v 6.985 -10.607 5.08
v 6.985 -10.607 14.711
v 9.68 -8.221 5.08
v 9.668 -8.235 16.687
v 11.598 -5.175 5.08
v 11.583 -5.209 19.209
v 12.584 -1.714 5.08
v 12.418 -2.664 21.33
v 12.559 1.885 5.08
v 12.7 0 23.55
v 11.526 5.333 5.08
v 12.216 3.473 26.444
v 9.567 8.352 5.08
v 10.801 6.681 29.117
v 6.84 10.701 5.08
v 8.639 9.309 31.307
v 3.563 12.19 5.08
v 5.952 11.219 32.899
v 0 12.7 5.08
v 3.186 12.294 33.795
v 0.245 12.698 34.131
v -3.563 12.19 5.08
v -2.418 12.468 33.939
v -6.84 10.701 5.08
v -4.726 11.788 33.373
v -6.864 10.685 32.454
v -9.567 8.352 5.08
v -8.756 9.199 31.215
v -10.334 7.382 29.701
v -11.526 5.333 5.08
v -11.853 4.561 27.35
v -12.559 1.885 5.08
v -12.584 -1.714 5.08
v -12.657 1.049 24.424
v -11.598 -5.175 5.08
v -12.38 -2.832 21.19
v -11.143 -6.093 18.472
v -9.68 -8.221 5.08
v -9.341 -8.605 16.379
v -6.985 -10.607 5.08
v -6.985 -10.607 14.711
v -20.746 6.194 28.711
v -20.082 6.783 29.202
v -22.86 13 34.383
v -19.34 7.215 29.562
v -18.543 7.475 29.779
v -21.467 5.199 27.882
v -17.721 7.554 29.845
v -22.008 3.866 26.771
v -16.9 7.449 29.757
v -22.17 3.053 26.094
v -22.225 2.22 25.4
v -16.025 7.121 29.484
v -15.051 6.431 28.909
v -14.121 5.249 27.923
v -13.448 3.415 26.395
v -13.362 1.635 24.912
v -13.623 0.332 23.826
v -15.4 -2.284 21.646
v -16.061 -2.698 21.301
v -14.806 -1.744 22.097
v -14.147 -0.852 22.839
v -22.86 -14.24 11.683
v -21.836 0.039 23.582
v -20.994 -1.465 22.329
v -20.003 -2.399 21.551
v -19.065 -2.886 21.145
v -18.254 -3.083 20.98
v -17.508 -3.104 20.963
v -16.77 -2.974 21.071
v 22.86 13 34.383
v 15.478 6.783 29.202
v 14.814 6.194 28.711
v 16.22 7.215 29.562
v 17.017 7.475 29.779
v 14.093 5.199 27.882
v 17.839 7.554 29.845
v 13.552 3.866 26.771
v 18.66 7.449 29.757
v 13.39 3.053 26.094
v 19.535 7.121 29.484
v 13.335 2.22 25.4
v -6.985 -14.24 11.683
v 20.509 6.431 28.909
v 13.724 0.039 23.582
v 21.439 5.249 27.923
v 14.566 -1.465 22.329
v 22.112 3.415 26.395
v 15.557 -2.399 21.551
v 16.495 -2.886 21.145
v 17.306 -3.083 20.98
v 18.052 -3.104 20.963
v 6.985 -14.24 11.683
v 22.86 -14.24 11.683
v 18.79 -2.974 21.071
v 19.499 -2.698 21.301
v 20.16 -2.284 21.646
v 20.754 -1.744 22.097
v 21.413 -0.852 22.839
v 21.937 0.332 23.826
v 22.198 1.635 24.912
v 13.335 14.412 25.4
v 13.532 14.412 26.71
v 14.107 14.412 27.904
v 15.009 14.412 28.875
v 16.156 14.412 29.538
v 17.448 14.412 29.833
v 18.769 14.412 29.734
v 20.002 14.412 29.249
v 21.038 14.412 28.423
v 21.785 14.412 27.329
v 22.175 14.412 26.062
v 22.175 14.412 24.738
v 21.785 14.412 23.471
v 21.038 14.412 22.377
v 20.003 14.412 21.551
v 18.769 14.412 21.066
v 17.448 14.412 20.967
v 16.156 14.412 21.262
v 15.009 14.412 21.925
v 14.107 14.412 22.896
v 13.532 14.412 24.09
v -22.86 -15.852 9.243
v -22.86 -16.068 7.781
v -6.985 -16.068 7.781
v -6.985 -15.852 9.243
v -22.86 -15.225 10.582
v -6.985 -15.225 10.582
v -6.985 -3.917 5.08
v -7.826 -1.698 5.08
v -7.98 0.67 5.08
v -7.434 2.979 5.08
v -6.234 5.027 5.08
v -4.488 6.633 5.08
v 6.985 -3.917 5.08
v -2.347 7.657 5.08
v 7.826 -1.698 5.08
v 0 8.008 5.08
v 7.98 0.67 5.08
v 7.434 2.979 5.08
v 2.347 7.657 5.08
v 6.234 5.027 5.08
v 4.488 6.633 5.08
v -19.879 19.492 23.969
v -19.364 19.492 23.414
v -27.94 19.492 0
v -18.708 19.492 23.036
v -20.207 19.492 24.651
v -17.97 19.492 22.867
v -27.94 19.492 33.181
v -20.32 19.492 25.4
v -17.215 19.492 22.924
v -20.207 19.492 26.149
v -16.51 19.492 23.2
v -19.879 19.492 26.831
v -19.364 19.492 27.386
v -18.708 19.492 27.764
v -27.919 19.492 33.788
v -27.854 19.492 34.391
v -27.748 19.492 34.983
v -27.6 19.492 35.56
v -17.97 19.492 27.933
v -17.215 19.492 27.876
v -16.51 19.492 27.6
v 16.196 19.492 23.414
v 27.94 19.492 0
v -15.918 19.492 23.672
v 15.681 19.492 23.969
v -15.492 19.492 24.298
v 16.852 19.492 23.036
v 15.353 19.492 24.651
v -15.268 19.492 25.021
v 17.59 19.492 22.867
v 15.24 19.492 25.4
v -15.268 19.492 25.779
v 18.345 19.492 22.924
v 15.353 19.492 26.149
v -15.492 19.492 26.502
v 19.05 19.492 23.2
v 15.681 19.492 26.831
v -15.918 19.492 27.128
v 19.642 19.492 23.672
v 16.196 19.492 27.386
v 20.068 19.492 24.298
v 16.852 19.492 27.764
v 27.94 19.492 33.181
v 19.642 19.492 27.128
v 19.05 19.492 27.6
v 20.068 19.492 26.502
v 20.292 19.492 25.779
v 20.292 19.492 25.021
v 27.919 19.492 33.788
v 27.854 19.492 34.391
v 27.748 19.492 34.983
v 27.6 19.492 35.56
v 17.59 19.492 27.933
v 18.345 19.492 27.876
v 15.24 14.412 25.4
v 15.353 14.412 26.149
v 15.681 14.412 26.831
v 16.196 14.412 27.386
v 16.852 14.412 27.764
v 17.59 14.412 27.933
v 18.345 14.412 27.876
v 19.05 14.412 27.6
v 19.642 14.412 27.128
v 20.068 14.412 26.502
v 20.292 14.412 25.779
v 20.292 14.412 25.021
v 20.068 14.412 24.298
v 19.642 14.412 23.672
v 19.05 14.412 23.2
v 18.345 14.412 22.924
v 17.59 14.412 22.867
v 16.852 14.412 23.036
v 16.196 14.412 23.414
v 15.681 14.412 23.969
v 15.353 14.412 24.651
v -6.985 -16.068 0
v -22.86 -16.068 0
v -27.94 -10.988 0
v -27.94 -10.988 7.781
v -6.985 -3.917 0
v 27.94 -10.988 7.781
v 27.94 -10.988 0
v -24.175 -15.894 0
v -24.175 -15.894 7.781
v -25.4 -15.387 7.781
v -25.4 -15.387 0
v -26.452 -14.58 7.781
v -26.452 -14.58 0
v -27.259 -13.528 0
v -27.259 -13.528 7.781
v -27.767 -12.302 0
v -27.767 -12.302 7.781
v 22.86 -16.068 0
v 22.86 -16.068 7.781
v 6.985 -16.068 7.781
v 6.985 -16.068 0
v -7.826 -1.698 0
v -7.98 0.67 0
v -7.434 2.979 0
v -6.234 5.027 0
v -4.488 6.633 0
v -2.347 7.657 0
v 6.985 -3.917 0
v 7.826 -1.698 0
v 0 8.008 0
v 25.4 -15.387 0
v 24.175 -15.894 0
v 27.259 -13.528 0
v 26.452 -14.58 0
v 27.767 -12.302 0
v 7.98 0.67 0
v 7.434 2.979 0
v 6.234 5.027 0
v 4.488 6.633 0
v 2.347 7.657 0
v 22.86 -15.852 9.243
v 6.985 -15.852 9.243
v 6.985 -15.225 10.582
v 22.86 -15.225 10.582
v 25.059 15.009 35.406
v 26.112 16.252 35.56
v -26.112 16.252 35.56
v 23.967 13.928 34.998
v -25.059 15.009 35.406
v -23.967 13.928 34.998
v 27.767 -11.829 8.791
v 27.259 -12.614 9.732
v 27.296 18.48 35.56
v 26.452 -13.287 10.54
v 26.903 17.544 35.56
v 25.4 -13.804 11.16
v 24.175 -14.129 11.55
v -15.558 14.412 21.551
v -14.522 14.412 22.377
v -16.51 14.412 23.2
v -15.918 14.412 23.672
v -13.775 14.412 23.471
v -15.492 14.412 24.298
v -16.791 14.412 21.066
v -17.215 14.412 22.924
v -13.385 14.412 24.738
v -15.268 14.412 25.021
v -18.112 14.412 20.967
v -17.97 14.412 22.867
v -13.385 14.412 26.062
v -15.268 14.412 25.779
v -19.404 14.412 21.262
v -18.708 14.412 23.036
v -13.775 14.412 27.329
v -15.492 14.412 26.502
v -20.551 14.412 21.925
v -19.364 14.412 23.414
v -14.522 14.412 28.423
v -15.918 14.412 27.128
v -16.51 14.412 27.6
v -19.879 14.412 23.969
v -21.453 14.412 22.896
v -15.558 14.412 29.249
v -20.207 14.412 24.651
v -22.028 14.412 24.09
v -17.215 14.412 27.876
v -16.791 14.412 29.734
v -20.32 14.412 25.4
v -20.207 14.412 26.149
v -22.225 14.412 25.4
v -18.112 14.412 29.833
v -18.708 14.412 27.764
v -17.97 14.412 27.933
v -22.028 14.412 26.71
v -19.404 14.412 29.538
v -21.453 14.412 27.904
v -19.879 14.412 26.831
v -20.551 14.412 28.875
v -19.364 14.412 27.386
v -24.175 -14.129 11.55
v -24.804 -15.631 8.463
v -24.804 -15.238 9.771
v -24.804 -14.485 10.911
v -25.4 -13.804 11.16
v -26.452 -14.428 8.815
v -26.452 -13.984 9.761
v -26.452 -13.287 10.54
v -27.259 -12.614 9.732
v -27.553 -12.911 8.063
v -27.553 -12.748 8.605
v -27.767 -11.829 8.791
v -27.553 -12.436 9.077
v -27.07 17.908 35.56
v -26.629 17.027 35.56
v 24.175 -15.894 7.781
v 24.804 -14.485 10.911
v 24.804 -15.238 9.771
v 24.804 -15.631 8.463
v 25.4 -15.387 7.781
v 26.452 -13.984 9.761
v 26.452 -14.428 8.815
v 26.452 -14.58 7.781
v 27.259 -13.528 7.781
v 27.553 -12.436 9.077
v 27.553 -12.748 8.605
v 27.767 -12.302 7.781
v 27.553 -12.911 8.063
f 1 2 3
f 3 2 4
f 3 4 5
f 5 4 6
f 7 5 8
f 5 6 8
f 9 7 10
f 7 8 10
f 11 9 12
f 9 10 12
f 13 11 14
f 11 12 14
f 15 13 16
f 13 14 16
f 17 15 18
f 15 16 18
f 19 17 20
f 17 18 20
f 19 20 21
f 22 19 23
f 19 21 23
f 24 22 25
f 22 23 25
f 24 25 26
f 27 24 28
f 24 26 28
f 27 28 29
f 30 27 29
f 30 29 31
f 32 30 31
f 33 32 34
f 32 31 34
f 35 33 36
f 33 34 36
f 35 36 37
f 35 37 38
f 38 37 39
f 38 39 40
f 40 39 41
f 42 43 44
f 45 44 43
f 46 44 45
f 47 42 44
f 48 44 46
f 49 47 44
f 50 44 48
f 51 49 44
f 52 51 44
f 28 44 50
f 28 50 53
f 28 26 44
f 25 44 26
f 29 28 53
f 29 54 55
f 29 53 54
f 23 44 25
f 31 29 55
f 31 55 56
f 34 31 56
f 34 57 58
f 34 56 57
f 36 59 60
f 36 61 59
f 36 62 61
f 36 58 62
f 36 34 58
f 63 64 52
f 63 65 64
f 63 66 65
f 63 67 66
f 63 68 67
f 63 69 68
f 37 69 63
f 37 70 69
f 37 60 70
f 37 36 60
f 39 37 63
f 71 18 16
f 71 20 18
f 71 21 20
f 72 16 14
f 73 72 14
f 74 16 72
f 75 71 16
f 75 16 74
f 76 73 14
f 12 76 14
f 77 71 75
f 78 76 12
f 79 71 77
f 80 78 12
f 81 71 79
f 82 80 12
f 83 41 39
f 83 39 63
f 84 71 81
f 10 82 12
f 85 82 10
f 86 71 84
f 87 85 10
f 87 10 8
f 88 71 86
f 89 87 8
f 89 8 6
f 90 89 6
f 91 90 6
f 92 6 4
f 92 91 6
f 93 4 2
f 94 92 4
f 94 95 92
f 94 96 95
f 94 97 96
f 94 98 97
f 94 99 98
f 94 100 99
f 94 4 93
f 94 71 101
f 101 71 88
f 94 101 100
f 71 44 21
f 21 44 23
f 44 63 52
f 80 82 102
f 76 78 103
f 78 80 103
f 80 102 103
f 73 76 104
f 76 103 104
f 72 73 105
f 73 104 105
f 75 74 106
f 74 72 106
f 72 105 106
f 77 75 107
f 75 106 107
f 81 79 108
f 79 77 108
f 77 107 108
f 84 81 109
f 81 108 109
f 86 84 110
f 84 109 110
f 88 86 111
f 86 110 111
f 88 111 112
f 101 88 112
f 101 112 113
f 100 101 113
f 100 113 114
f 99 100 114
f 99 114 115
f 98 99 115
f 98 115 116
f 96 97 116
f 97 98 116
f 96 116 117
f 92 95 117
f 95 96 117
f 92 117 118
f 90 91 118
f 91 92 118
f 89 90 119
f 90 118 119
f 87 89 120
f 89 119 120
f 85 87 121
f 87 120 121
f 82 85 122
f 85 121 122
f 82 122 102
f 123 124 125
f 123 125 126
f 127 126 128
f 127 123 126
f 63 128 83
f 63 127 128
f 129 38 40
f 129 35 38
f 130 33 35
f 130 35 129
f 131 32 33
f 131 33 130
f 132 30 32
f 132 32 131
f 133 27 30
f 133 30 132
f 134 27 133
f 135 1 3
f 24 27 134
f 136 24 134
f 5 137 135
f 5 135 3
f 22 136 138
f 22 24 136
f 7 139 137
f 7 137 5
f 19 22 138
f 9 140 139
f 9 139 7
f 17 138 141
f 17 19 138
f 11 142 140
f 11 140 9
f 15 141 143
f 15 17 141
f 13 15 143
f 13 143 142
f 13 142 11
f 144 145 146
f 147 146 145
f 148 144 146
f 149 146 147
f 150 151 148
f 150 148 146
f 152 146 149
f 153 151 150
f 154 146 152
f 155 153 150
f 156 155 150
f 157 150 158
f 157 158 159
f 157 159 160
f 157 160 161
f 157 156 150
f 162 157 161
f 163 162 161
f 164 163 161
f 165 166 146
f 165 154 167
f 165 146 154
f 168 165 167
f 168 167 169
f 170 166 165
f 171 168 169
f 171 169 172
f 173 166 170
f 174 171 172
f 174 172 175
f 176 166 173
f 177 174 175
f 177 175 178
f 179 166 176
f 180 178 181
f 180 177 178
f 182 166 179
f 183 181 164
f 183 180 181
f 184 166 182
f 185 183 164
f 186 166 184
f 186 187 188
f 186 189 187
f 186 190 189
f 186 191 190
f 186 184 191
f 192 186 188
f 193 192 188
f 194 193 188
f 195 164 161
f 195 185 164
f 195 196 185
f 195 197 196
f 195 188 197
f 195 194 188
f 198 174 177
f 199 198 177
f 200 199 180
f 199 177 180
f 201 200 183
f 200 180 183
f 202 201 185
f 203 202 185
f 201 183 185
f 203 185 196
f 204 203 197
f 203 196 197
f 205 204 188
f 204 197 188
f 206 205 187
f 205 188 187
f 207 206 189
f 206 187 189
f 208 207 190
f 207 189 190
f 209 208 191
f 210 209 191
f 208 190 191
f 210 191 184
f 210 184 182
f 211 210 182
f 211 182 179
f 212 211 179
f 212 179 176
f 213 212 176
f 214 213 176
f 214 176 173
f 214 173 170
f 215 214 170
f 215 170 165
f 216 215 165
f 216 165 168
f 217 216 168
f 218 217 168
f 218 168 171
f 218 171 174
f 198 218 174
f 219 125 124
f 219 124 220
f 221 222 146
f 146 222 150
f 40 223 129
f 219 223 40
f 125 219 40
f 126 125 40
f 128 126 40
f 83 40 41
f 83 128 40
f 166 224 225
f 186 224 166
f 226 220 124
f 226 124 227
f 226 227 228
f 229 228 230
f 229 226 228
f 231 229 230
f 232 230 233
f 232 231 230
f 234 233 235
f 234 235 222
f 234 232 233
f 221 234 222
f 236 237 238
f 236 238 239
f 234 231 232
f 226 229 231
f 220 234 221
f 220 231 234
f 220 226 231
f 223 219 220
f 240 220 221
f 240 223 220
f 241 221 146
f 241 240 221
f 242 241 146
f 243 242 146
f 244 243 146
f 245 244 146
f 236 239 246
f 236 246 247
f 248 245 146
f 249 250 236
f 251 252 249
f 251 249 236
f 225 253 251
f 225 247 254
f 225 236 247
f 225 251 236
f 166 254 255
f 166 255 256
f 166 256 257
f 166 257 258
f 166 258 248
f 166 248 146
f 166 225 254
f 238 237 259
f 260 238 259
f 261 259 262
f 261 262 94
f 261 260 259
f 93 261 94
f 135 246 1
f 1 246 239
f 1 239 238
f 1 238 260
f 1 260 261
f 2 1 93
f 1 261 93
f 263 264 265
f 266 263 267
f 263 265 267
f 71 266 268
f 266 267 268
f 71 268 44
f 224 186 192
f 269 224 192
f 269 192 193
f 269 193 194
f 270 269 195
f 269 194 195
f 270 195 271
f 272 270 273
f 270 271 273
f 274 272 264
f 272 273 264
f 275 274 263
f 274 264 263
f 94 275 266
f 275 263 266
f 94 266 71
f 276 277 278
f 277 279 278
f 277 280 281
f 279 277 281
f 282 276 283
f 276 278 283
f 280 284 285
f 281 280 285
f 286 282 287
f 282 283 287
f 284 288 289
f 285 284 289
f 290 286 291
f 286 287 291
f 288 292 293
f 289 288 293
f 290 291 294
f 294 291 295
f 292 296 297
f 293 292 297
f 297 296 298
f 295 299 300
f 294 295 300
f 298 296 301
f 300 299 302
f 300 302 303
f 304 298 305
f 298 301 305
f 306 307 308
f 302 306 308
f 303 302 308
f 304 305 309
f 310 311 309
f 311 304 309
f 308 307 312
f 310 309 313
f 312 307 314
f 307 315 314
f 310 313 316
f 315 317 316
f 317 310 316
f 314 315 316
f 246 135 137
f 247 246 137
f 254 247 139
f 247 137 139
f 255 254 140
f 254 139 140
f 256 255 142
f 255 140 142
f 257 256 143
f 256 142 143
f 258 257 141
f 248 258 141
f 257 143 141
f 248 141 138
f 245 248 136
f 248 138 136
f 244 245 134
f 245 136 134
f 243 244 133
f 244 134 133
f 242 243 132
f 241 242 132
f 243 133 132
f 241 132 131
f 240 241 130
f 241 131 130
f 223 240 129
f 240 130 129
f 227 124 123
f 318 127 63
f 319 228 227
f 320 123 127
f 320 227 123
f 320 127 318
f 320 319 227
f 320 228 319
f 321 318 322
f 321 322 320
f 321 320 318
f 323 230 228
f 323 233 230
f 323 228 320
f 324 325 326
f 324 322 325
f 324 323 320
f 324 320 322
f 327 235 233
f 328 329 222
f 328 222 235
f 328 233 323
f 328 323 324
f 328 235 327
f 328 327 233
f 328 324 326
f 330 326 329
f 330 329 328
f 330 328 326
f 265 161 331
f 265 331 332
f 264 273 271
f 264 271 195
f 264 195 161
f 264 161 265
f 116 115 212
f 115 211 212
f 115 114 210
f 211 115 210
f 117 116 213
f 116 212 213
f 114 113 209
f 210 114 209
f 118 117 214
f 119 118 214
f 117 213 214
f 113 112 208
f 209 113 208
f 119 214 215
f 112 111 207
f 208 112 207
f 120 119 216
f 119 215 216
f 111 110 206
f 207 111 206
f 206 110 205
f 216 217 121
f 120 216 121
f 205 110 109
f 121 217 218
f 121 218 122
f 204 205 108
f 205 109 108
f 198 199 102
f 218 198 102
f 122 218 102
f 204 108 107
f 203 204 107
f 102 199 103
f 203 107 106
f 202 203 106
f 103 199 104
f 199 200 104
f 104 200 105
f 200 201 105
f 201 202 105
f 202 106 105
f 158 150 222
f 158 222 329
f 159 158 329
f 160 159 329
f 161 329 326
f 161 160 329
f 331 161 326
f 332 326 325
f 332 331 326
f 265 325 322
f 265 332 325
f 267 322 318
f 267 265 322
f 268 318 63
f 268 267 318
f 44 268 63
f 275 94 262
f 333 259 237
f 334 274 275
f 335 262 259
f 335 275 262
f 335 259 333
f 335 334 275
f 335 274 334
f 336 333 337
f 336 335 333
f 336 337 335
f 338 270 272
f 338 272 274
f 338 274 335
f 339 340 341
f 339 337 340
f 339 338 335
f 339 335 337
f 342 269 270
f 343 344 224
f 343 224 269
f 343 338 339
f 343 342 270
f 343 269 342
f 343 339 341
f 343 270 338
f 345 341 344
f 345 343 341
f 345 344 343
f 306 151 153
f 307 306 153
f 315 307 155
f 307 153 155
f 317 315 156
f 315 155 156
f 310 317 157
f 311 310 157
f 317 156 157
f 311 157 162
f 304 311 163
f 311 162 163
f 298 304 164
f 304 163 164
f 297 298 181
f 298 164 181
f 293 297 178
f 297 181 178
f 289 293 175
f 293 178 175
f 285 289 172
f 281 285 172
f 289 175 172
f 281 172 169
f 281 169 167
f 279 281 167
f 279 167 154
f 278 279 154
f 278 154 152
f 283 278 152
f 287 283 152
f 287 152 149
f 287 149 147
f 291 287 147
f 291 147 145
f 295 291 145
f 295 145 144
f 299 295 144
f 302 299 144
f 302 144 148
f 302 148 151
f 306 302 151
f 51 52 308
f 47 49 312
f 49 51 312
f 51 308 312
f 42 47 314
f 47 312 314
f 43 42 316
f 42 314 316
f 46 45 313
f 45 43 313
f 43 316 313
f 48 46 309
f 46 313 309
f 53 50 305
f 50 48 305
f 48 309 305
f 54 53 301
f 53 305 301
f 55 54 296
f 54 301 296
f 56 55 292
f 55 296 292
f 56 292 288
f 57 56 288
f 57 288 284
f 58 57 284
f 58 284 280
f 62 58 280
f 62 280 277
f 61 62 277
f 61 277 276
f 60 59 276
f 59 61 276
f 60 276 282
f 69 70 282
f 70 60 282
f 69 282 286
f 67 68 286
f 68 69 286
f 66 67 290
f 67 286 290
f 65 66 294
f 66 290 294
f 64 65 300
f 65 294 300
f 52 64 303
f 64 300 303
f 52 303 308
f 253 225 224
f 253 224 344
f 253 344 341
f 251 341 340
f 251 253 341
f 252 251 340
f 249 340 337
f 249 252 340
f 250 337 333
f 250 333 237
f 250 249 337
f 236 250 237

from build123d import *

# Parameters (mm, degrees)
F1_DEPTH     = 27.94
F2_R         = 12.7
F3_DEPTH     = 30.48
F4_R         = 8.0083112146
F5_DEPTH     = 50.8
F6_W         = 13.97
F6_H         = 30.48
F7_DEPTH     = 19.05
F8_T1_DEPTH  = 21.823361814
F8_T3_DEPTH  = 21.823361814
F8_T5_DEPTH  = 20.4806552744
F8_T7_DEPTH  = 49.996723628
F8_T9_DEPTH  = 65.0760683536
F8_T14_DEPTH = 5.08
F8_T20_DEPTH = 5.08
F9_R         = 2.54
F10_DEPTH    = 20.321
F12_R        = 4.445
F13_DEPTH    = 25.4


# Not quite as in the source:
# - a fillet or chamfer that OpenCascade refuses, or shapes differently, is made with other operations: its cross-section is extruded or revolved along the edge and cut away or added


with BuildPart() as f1:
    # F0 (on Right) → F1 (new body, symmetric)
    with BuildSketch(Plane.YZ):
        Polygon((-16.0675346851, 10.16), (-16.0675346851, 0), (19.4924653149, 0), (19.4924653149, 35.56), (14.4124653149, 35.56), align=None)
    extrude(amount=F1_DEPTH, both=True)

    # F2 (on face) → F3 (cut)
    with BuildSketch(Plane.XY.offset(35.56)):
        Circle(F2_R)
    extrude(amount=-F3_DEPTH, mode=Mode.SUBTRACT)

    # F4 (on face) → F5 (cut)
    with BuildSketch(Plane.XY.offset(5.08)):
        Circle(F4_R)
    extrude(amount=-F5_DEPTH, mode=Mode.SUBTRACT)

    # F6 (on face) → F7 (cut)
    with BuildSketch(Plane.XZ.offset(16.0675346851)):
        Rectangle(F6_W, F6_H)
    extrude(amount=-F7_DEPTH, mode=Mode.SUBTRACT)

    # F8: fillet of radius 5.08 on 7 edges, made by hand

    # F8_s2 → F8_t1 (cut)
    with BuildSketch(Plane.YZ.offset(-22.86)):
        with BuildLine():
            ThreePointArc((-16.0675346851, 7.7806552744), (-15.587928945, 9.9353646873), (-14.2396714354, 11.6832193748))
            Line((-14.2396714354, 11.6832193748), (-16.0675346851, 10.16))
            Line((-16.0675346851, 10.16), (-16.0675346851, 7.7806552744))
        make_face()
    extrude(amount=F8_T1_DEPTH, mode=Mode.SUBTRACT)

    # F8_s4 → F8_t3 (cut)
    with BuildSketch(Plane.YZ.offset(1.036638186)):
        with BuildLine():
            ThreePointArc((-16.0675346851, 7.7806552744), (-15.587928945, 9.9353646873), (-14.2396714354, 11.6832193748))
            Line((-14.2396714354, 11.6832193748), (-16.0675346851, 10.16))
            Line((-16.0675346851, 10.16), (-16.0675346851, 7.7806552744))
        make_face()
    extrude(amount=F8_T3_DEPTH, mode=Mode.SUBTRACT)

    # F8_s6 → F8_t5 (cut)
    with BuildSketch(Plane.XY.offset(-12.7)):
        with BuildLine():
            ThreePointArc((27.94, -10.9875346851), (26.4521024484, -14.5796371336), (22.86, -16.0675346851))
            Line((22.86, -16.0675346851), (27.94, -16.0675346851))
            Line((27.94, -16.0675346851), (27.94, -10.9875346851))
        make_face()
        with BuildLine():
            ThreePointArc((-22.86, -16.0675346851), (-26.4521024484, -14.5796371336), (-27.94, -10.9875346851))
            Line((-27.94, -10.9875346851), (-27.94, -16.0675346851))
            Line((-27.94, -16.0675346851), (-22.86, -16.0675346851))
        make_face()
    extrude(amount=F8_T5_DEPTH, mode=Mode.SUBTRACT)

    # F8_s8 → F8_t7 (cut)
    with BuildSketch(Plane(origin=(0, 35.7506520761, 29.7922100634), x_dir=(1, 0, 0), z_dir=(0, -0.7682212796, -0.6401843997))):
        with BuildLine():
            ThreePointArc((27.94, 13.0113132472), (26.4521024484, 16.6034156956), (22.86, 18.0913132472))
            Line((22.86, 18.0913132472), (27.94, 18.0913132472))
            Line((27.94, 18.0913132472), (27.94, 13.0113132472))
        make_face()
        with BuildLine():
            ThreePointArc((-27.94, 13.0113132472), (-26.4521024484, 16.6034156956), (-22.86, 18.0913132472))
            Line((-22.86, 18.0913132472), (-27.94, 18.0913132472))
            Line((-27.94, 18.0913132472), (-27.94, 13.0113132472))
        make_face()
    extrude(amount=F8_T7_DEPTH, mode=Mode.SUBTRACT)

    # F8_s10 → F8_t9 (cut)
    with BuildSketch(Plane.YZ.offset(-32.5380341768)):
        with BuildLine():
            ThreePointArc((16.2516789856, 35.56), (14.5223186457, 35.2565796146), (12.9995422353, 34.3825641004))
            Line((12.9995422353, 34.3825641004), (14.4124653149, 35.56))
            Line((14.4124653149, 35.56), (16.2516789856, 35.56))
        make_face()
    extrude(amount=F8_T9_DEPTH, mode=Mode.SUBTRACT)


with BuildPart() as f8_tool12:
    # F8_s13 → F8_t14 (new body)
    with BuildSketch(Plane.YZ.offset(-22.86)):
        Polygon((-10.9875346851, 7.7806552744), (-14.2396714354, 11.6832193748), (-16.0675346851, 10.16), (-16.0675346851, 7.7806552744), align=None)
    extrude(amount=-F8_T14_DEPTH)

    # F8_s15 → F8_t16 (revolve, cut)
    with BuildSketch(Plane(origin=(-22.86, -10.9875346851, 7.7806552744), x_dir=(0, 0.9055894212, -0.4241553962), z_dir=(0, 0.4241553962, 0.9055894212))):
        with BuildLine():
            ThreePointArc((0, -5.08), (5.08, 0), (0, 5.08))
            Line((0, 5.08), (0, -5.08))
        make_face()
    revolve(axis=Axis((-22.86, -10.9875346851, 7.7806552744), (-1, 0, 0)), mode=Mode.SUBTRACT)


with BuildPart() as f1_1:
    add(f1.part)

    # F8_t11: cut F8_tool12
    add(f8_tool12.part, mode=Mode.SUBTRACT)


with BuildPart() as f8_tool18:
    # F8_s19 → F8_t20 (new body)
    with BuildSketch(Plane.YZ.offset(22.86)):
        Polygon((-10.9875346851, 7.7806552744), (-16.0675346851, 7.7806552744), (-16.0675346851, 10.16), (-14.2396714354, 11.6832193748), align=None)
    extrude(amount=F8_T20_DEPTH)

    # F8_s21 → F8_t22 (revolve, cut)
    with BuildSketch(Plane(origin=(22.86, -10.9875346851, 7.7806552744), x_dir=(0, 0.9055894212, -0.4241553962), z_dir=(0, -0.4241553962, -0.9055894212))):
        with BuildLine():
            ThreePointArc((0, -5.08), (5.08, 0), (0, 5.08))
            Line((0, 5.08), (0, -5.08))
        make_face()
    revolve(axis=Axis((22.86, -10.9875346851, 7.7806552744), (1, 0, 0)), mode=Mode.SUBTRACT)


with BuildPart() as f1_2:
    add(f1_1.part)

    # F8_t17: cut F8_tool18
    add(f8_tool18.part, mode=Mode.SUBTRACT)

    # F9 (on face) → F10 (cut, through all)
    with BuildSketch(Plane(origin=(0, 19.4924653149, 0), x_dir=(-1, 0, 0), z_dir=(0, 1, 0))):
        with Locations((-17.78, 25.4)):
            Circle(F9_R)
        with Locations((17.78, 25.4)):
            Circle(F9_R)
    extrude(amount=-F10_DEPTH, mode=Mode.SUBTRACT)

    # F12 (on offset) → F13 (cut)
    with BuildSketch(Plane(origin=(0, 14.4124653149, 0), x_dir=(-1, 0, 0), z_dir=(0, 1, 0))):
        with Locations((-17.78, 25.4)):
            Circle(F12_R)
        with Locations((17.78, 25.4)):
            Circle(F12_R)
    extrude(amount=-F13_DEPTH, mode=Mode.SUBTRACT)


solid = f1_2.part
